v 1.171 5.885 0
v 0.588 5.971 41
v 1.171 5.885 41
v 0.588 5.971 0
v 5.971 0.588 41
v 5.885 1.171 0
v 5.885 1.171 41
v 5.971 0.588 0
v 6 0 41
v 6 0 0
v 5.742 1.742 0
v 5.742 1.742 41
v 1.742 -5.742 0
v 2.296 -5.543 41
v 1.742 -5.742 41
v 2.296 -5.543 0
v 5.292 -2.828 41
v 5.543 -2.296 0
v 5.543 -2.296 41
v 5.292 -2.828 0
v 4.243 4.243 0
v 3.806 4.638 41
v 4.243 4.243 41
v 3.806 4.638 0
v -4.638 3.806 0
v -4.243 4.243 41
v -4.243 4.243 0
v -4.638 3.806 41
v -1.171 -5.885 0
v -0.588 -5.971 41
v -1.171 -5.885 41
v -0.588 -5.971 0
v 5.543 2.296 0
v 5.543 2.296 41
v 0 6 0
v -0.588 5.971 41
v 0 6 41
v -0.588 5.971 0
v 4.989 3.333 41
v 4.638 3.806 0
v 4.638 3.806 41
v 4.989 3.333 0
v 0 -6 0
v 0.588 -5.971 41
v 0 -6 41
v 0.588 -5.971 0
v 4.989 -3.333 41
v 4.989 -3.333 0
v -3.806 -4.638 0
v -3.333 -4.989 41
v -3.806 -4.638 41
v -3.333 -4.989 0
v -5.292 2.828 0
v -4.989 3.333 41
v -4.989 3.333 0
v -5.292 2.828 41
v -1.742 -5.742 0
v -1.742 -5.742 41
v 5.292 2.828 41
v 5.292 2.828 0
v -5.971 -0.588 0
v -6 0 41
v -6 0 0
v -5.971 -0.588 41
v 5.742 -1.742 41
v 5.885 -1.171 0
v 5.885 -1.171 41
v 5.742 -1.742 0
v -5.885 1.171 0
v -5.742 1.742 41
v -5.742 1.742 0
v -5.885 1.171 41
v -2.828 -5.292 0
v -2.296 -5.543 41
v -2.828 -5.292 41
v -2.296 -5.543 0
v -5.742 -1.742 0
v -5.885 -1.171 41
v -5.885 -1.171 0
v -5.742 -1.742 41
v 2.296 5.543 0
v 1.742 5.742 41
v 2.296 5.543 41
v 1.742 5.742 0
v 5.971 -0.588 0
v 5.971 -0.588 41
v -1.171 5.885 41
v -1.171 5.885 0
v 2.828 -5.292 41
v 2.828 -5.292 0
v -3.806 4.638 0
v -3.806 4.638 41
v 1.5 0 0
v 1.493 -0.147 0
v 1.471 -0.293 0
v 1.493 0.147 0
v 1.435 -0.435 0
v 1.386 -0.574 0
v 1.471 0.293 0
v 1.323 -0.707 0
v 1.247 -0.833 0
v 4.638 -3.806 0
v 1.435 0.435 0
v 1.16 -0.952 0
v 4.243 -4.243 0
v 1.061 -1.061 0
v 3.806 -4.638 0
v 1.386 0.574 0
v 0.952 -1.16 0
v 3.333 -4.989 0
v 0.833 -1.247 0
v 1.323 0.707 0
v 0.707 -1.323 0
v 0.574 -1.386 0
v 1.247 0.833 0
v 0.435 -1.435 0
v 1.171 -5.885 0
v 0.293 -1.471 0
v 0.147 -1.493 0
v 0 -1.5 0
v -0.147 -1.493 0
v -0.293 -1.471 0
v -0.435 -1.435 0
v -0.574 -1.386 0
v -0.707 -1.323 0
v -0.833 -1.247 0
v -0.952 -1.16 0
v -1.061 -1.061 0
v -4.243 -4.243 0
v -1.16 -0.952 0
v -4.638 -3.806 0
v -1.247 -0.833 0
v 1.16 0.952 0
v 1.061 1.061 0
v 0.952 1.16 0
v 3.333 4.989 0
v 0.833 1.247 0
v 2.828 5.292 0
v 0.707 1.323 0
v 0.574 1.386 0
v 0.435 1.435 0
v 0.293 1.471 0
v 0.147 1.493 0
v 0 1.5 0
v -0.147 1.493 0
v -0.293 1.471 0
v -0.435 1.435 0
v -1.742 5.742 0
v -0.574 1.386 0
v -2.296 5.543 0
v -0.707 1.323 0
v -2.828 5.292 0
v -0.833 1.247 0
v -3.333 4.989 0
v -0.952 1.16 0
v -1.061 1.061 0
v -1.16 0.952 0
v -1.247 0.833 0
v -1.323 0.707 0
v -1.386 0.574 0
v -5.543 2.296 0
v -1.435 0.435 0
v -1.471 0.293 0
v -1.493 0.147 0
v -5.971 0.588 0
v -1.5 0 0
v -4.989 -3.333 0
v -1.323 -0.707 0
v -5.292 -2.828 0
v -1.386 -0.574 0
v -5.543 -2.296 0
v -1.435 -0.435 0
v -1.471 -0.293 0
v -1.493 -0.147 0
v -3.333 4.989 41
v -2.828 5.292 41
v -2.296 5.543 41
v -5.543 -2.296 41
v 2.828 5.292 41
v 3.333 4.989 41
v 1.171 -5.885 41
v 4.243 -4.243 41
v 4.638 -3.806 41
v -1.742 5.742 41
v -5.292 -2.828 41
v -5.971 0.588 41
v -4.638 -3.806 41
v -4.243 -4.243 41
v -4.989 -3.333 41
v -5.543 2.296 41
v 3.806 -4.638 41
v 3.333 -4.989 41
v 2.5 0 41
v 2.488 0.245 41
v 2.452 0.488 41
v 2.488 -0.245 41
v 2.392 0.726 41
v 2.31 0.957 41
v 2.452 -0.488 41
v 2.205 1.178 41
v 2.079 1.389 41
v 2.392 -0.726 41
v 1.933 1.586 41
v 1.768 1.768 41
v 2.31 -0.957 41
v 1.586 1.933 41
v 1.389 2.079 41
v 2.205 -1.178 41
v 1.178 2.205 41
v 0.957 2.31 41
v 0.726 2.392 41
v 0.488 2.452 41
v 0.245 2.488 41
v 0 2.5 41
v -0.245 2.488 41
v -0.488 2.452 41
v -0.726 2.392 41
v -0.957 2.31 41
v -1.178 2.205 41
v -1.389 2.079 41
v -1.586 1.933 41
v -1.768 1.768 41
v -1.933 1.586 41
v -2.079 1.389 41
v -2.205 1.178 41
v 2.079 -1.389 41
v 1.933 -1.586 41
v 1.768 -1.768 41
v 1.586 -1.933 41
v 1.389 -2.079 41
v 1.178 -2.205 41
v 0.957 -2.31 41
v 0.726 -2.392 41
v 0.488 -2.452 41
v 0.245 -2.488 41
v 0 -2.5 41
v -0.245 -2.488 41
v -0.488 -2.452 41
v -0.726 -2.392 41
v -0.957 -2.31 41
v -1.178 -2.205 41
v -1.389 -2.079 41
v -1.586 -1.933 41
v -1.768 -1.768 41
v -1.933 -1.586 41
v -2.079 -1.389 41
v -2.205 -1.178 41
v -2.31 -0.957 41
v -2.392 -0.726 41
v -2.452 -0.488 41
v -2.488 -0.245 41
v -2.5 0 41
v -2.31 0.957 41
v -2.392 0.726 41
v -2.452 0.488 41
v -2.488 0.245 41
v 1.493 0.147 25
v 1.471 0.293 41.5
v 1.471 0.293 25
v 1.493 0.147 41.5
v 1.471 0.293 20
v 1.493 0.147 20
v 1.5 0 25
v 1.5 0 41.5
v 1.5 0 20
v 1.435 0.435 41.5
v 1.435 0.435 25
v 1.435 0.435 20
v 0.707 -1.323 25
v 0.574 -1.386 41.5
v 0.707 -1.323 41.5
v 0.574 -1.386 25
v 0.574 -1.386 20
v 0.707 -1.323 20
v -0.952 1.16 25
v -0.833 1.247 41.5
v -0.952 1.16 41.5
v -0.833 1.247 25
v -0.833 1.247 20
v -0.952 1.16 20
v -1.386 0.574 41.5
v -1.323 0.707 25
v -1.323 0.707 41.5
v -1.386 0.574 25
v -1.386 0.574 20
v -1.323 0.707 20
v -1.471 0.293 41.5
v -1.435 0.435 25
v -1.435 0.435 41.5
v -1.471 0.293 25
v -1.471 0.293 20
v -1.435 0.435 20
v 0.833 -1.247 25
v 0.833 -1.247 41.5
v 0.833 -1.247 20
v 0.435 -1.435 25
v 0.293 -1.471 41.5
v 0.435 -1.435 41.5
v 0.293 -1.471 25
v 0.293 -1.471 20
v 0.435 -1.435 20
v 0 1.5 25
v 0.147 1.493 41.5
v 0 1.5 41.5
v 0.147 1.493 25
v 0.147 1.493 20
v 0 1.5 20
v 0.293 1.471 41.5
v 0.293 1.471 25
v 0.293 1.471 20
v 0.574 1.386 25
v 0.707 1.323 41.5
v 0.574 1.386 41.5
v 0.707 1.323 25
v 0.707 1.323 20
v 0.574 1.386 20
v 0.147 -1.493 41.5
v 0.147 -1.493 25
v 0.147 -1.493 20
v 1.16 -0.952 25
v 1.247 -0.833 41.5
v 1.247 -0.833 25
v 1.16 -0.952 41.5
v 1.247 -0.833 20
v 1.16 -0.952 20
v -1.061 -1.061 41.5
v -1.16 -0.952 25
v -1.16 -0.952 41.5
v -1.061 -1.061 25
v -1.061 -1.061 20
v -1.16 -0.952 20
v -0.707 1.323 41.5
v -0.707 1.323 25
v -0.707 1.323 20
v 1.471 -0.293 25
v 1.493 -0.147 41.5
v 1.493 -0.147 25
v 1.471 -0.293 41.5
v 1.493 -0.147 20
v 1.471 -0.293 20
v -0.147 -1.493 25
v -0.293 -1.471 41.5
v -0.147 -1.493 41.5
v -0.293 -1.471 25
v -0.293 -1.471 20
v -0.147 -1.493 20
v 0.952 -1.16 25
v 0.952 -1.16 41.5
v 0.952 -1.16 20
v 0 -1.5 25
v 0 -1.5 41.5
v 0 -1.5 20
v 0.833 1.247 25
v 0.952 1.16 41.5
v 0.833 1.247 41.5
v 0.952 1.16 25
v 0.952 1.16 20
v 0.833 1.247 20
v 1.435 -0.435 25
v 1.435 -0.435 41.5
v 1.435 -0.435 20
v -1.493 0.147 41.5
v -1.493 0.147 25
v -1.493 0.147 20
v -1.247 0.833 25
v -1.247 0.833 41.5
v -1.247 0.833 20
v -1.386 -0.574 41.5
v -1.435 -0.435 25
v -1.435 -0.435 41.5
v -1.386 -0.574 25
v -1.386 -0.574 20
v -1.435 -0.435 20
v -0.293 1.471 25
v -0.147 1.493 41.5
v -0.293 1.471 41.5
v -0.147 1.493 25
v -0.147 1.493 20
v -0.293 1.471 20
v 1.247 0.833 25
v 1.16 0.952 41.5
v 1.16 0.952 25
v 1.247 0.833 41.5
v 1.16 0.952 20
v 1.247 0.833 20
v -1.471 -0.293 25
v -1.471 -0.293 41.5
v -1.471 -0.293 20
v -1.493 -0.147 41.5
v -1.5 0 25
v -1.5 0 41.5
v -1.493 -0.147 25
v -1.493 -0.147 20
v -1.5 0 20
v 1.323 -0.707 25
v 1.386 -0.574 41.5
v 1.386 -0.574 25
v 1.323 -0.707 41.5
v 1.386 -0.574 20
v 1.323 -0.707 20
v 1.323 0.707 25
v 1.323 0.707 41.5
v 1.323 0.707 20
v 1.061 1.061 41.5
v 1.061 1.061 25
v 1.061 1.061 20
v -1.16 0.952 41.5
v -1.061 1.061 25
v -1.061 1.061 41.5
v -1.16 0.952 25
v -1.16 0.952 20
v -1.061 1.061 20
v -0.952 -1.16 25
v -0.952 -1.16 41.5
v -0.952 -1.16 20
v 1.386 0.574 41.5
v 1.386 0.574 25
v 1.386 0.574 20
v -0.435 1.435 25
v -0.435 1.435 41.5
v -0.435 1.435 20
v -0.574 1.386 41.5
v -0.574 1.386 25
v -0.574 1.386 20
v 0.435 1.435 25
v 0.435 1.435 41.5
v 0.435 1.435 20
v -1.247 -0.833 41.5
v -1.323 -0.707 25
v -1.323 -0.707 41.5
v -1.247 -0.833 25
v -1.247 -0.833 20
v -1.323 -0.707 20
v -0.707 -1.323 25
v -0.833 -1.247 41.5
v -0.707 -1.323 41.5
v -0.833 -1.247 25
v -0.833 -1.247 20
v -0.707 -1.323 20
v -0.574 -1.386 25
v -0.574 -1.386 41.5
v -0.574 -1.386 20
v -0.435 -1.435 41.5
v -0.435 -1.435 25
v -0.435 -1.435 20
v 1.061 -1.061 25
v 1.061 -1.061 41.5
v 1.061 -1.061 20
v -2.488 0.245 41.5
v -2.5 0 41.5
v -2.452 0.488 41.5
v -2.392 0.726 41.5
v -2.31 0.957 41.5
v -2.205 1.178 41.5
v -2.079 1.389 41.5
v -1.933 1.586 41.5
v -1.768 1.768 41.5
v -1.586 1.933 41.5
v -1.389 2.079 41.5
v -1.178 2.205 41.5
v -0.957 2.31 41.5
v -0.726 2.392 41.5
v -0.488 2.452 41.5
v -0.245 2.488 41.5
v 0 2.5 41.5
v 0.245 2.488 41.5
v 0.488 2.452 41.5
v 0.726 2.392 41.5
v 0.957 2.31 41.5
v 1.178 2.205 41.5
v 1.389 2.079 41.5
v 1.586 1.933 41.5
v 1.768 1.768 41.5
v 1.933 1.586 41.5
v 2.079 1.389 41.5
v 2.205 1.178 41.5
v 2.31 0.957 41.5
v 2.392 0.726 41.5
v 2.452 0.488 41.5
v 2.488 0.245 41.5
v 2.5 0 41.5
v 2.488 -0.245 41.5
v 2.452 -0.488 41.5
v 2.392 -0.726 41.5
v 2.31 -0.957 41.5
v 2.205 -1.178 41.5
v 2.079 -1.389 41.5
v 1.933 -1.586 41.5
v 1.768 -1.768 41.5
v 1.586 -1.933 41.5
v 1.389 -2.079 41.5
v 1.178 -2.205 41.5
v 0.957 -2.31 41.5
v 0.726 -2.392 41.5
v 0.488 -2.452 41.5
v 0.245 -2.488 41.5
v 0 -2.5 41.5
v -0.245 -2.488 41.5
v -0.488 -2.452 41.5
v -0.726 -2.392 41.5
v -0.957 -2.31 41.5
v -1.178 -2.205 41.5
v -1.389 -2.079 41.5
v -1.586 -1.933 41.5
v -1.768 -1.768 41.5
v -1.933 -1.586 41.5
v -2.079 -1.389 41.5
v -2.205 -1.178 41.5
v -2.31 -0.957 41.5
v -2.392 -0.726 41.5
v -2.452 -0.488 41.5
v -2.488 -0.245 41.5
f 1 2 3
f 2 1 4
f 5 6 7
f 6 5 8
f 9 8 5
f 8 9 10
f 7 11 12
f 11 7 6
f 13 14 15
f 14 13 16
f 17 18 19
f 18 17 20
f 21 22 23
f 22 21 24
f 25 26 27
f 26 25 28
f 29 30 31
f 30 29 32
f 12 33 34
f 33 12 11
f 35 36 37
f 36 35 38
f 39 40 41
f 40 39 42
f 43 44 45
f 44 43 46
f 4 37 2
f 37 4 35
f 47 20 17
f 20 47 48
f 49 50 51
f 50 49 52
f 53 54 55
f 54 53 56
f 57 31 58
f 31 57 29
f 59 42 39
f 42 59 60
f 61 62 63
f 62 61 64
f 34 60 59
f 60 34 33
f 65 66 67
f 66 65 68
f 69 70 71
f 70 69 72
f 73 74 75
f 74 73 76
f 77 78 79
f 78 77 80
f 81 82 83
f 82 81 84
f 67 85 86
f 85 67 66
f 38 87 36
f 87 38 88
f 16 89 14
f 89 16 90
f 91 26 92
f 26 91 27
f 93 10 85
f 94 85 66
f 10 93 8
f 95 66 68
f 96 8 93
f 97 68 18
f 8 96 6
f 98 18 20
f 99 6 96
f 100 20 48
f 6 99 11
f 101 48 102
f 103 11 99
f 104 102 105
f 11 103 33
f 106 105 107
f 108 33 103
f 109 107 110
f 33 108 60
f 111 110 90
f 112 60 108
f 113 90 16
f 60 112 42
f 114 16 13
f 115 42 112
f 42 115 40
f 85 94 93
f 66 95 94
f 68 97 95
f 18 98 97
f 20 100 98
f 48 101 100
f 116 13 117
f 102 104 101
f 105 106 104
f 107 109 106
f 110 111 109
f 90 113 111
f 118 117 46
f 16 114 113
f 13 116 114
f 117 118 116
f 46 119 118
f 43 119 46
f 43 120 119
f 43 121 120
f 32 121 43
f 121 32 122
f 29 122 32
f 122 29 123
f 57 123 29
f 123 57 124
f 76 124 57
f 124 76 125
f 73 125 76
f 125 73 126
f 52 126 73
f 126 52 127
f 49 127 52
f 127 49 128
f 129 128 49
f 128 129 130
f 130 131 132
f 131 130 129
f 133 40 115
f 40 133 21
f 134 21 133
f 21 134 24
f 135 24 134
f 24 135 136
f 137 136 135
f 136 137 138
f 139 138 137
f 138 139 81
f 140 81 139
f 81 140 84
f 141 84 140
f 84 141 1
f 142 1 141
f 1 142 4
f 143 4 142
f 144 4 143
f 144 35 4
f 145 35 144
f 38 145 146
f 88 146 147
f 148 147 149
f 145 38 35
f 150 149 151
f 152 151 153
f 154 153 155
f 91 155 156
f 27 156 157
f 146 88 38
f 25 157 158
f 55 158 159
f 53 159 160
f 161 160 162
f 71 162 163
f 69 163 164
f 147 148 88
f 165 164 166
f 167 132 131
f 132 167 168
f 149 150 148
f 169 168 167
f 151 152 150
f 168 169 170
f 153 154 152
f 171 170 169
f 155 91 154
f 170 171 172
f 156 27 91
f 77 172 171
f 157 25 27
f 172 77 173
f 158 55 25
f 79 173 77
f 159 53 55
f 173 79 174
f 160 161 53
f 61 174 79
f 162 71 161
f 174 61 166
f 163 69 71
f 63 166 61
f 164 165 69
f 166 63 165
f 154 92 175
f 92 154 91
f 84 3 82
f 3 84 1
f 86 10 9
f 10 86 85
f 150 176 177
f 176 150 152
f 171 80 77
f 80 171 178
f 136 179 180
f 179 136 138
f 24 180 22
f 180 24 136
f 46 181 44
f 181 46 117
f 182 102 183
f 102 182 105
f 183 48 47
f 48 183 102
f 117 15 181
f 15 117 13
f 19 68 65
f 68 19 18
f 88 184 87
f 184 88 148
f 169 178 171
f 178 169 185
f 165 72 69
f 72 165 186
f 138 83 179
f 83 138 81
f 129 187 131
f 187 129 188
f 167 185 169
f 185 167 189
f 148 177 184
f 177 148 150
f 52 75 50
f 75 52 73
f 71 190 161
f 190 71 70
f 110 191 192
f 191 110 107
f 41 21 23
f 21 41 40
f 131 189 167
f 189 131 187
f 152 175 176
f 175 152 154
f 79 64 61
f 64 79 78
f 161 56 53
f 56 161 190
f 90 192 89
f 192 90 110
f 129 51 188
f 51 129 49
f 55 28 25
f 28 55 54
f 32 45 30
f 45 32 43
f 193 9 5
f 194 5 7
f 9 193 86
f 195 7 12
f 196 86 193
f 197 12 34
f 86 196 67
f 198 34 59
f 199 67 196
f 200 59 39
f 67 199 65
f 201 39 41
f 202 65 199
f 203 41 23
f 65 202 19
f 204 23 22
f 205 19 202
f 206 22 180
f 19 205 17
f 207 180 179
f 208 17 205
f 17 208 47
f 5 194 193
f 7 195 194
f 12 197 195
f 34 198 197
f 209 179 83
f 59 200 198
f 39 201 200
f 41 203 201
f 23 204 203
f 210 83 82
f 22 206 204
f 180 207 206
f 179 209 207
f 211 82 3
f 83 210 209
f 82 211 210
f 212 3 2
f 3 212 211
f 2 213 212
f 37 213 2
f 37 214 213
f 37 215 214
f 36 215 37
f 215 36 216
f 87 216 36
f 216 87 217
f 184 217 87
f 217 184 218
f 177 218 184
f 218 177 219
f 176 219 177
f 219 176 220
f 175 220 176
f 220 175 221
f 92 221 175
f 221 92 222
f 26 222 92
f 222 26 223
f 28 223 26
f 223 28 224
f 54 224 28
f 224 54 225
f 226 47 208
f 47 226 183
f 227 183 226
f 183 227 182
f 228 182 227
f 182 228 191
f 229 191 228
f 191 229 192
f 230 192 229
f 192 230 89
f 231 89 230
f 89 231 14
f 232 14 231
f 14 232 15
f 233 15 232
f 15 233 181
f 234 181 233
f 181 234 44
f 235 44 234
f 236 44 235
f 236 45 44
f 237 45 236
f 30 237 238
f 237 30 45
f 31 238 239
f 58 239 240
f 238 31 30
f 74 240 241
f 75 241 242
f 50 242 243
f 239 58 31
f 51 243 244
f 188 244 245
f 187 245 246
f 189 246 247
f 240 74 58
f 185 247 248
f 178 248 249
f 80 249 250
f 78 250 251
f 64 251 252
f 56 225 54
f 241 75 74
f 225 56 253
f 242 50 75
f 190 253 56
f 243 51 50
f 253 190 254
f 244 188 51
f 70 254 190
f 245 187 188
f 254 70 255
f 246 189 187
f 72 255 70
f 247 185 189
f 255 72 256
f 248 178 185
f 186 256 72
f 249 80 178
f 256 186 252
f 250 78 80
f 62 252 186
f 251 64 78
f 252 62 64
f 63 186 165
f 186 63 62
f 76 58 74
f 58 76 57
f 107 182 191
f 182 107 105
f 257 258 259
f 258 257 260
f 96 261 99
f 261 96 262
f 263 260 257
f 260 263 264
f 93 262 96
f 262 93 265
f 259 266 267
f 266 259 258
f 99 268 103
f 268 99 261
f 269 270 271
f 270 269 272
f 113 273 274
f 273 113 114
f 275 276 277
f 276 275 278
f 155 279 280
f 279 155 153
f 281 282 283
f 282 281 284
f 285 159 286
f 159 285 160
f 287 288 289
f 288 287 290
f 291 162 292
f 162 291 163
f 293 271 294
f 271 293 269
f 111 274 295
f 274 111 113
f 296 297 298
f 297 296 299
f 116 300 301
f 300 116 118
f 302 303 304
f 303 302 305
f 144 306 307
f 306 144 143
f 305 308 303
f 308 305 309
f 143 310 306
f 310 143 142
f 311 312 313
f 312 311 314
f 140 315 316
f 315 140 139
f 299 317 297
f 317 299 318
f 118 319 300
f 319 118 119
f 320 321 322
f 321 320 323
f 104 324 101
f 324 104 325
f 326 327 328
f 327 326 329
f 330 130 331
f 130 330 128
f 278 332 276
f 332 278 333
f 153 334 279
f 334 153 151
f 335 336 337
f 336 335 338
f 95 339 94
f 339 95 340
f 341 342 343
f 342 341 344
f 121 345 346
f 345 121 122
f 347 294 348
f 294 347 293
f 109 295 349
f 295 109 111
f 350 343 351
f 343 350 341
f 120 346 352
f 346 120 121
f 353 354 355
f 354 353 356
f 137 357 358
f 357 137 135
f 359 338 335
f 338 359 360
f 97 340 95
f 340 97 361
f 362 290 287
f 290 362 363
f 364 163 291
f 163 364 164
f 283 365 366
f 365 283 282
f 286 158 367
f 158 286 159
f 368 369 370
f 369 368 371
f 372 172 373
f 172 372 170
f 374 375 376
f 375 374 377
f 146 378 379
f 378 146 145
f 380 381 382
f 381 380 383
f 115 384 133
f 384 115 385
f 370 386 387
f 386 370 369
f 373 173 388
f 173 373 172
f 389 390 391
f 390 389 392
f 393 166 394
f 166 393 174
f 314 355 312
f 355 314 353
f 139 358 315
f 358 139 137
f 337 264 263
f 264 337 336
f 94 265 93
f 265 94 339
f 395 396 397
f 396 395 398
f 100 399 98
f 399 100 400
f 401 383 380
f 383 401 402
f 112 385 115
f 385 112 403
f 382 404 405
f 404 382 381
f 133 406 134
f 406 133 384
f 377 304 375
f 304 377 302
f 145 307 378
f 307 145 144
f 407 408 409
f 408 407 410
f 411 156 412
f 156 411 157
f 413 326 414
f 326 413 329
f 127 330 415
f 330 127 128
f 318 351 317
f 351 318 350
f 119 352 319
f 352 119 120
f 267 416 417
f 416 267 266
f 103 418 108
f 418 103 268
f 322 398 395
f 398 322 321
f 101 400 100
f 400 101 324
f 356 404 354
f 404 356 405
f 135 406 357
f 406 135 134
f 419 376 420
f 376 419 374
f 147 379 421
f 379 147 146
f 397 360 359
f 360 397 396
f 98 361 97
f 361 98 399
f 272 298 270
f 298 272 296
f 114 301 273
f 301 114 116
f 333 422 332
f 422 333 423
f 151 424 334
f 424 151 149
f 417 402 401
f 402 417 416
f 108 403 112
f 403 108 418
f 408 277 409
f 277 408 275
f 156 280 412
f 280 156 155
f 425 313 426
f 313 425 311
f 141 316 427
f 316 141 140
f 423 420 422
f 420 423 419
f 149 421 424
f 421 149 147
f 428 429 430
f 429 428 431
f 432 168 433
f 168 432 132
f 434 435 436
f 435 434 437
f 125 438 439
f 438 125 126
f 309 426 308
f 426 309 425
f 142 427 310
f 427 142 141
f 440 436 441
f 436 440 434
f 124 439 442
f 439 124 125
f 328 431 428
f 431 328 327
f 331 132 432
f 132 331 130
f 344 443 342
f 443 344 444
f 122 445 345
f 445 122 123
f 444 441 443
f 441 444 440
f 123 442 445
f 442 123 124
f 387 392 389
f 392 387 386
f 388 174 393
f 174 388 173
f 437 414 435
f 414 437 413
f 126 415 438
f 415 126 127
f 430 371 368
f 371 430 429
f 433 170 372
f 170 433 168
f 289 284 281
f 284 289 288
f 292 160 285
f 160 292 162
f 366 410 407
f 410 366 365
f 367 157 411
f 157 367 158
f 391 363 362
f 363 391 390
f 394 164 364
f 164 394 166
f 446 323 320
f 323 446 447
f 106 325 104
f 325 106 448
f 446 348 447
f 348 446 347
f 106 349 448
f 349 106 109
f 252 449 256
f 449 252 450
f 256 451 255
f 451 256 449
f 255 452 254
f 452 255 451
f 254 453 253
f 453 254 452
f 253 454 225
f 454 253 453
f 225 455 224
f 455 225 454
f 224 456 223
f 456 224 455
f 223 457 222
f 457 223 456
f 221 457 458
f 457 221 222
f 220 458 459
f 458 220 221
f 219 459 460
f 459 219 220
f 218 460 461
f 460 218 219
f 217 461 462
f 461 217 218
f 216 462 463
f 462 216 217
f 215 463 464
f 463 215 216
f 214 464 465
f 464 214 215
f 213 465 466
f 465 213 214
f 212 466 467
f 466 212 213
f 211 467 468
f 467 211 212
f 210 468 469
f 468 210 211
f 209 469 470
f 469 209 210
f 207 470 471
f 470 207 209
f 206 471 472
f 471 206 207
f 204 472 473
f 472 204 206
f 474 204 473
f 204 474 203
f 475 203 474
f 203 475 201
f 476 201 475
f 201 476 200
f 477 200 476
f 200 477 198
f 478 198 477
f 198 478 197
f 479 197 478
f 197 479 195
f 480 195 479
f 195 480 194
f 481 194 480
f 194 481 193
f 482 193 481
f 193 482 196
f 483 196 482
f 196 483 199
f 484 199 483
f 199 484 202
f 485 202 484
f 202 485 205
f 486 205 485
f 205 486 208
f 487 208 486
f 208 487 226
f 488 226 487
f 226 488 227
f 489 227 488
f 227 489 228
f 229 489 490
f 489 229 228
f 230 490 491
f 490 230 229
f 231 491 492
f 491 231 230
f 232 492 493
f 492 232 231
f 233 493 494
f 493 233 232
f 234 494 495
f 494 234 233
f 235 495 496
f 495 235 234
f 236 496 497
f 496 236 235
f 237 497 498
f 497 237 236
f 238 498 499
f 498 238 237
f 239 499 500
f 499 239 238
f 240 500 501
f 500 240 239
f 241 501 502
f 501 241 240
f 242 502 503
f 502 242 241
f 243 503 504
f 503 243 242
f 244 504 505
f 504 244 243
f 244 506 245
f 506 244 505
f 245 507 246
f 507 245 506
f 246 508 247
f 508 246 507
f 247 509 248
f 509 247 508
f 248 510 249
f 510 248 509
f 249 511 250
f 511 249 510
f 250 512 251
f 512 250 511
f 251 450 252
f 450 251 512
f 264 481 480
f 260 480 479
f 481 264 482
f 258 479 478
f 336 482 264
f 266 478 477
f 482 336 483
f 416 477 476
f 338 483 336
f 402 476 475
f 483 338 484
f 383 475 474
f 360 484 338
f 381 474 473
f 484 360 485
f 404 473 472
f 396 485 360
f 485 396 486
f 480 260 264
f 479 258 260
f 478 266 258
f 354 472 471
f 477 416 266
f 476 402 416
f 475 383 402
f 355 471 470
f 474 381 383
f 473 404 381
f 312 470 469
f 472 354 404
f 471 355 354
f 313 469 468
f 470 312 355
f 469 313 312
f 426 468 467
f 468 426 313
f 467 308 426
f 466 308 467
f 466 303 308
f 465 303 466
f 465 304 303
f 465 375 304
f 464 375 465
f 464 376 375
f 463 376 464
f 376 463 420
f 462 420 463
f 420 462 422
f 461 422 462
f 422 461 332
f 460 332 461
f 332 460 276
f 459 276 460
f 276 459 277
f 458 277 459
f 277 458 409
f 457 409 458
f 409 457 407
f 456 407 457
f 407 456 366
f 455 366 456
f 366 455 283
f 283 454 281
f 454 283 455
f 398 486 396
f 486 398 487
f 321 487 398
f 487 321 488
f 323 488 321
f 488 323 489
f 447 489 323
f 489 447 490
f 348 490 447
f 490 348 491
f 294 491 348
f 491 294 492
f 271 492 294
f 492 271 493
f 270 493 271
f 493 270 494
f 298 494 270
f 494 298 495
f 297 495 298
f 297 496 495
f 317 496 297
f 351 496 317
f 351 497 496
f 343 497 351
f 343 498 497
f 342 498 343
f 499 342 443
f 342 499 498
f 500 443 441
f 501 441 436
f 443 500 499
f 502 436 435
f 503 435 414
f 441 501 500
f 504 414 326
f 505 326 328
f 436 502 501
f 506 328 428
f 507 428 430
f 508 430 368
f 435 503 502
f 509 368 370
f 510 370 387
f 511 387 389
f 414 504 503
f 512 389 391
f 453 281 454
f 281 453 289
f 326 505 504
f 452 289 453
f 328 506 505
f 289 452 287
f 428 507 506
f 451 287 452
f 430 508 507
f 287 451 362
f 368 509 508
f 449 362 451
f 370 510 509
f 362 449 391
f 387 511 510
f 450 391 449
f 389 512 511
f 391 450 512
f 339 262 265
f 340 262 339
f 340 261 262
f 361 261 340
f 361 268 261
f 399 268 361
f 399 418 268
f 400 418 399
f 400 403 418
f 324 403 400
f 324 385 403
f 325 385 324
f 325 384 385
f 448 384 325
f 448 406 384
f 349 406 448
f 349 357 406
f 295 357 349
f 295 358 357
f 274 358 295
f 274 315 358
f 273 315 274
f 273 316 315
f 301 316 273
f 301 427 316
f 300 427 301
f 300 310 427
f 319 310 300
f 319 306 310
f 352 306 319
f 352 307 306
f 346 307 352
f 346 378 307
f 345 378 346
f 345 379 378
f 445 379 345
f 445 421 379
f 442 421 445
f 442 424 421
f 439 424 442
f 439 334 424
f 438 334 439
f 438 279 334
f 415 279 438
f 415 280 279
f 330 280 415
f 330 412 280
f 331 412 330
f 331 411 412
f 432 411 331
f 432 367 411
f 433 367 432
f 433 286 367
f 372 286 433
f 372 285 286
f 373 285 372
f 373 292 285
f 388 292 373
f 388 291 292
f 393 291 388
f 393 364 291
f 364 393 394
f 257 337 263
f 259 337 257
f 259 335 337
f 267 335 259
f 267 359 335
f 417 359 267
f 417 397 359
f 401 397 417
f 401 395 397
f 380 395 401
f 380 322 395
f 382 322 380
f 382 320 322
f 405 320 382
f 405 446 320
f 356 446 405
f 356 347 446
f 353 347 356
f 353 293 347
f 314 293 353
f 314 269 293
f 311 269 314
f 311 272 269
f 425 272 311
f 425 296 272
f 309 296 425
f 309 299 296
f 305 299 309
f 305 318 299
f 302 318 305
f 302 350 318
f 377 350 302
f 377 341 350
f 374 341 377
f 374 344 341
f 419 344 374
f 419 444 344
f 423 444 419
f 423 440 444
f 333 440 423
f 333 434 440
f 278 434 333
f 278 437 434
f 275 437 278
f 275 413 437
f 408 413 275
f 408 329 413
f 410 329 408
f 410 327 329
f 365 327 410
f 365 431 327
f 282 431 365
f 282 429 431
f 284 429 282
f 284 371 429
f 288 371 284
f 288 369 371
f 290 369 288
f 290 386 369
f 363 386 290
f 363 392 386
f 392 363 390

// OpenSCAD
// Hose-Barb Reducer Design (Corrected)
// Units: mm
// Orientation: Standing upright on XY plane, building +Z

// --- Dimensions ---
// Main bore diameter
$main_bore_d = 3.0;
$main_bore_r = $main_bore_d / 2.0;

// Section 1: 8mm Tubing Interface (z=0 to z=20)
$sec1_start_z = 0;
$sec1_end_z = 20;
$sec1_barb_height = 10;
$sec1_barb_bottom_od = 7.5;
$sec1_barb_top_od = 9.5;
$sec1_barb_count = 2;
$sec1_barb_spacing = 12; // Center-to-center distance between barbs

// Section 2: Collar (z=20 to z=25)
$sec2_start_z = 20;
$sec2_end_z = 25;
$sec2_collar_od = 12;
$sec2_collar_id = $main_bore_d; // Matches main bore

// Section 3: 5mm Tubing Interface (z=25 to z=41)
$sec3_start_z = 25;
$sec3_end_z = 41;
$sec3_barb_height = 8;
$sec3_barb_bottom_od = 6.5;
$sec3_barb_top_od = 5.0;
$sec3_barb_count = 2;
$sec3_barb_spacing = 10; // Center-to-center distance between barbs

// --- Helper: Create Barb Profile Points ---
// Returns a list of [x, z] points for the cross-section of one barb
// z_start, z_end: The Z range of the barb
// r_bottom, r_top: Radii at bottom and top
// r_inner: Radius of the main bore (to ensure hole goes through)
// The profile is defined in the XZ plane, rotated around Z.
function get_barb_profile_points(z_start, z_end, r_bottom, r_top, r_inner) = 
    [
        // Bottom flat face (inner radius to outer radius)
        [r_inner, z_start],
        [r_bottom, z_start],
        // Taper up
        [r_bottom, z_end],
        [r_top, z_end],
        // Step out (flat top face)
        [r_top, z_end + 0.5],
        [r_inner, z_end + 0.5],
        // Close loop back to start
        [r_inner, z_start]
    ];

// --- Main Build ---

$fn = 64;

// We build the part in three main components:
// 1. The Main Body (Cylinder with central bore)
// 2. The Barbs (Union of all barb shapes)
// 3. The Collar (Cylinder)
// Then we Union them all together.

// 1. Main Body
// Height must cover the full length (41mm)
// Radius must be large enough to contain the widest part of the barbs (9.5mm)
// We add a tiny bit of safety margin for the collar calculation if needed, but 9.5 is the max OD.
// However, the collar is 12mm, so the main body radius must be at least 6mm.
// Let's make the main body radius 6mm (12mm OD) to cover the collar, 
// and the barbs will be added on top of this base.
$main_body_r = $sec2_collar_od / 2.0; 

translate([0, 0, 0])
difference() {
    // Outer shell of the main body
    cylinder(h = $sec3_end_z, r = $main_body_r, $fn = 64);
    
    // Inner bore through the whole length
    cylinder(h = $sec3_end_z, r = $main_bore_r, $fn = 64);
}

// 2. Section 1 Barbs (8mm tubing)
// Stacked at z=0 and z=10
translate([0, 0, 0])
union() {
    for (i = [0, 1]) {
        $z_pos = i * $sec1_barb_height;
        
        // Calculate radii
        $r_bottom = $sec1_barb_bottom_od / 2.0;
        $r_top = $sec1_barb_top_od / 2.0;
        
        // Get profile points
        $pts = get_barb_profile_points($z_pos, $z_pos + $sec1_barb_height, $r_bottom, $r_top, $main_bore_r);
        
        // Extrude the profile
        // The height of extrusion is the barb height + the step height (0.5mm)
        $extrude_h = $sec1_barb_height + 0.5;
        
        rotate_extrude()
        polygon(points = $pts);
    }
}

// 3. Section 2 Collar (z=20 to z=25)
translate([0, 0, $sec2_start_z])
cylinder(h = $sec2_end_z - $sec2_start_z, r = $sec2_collar_od / 2.0, $fn = 64);

// 4. Section 3 Barbs (5mm tubing)
// Stacked at z=25 and z=33
translate([0, 0, 0])
union() {
    for (i = [0, 1]) {
        $z_pos = $sec3_start_z + i * $sec3_barb_height;
        
        // Calculate radii
        $r_bottom = $sec3_barb_bottom_od / 2.0;
        $r_top = $sec3_barb_top_od / 2.0;
        
        // Get profile points
        $pts = get_barb_profile_points($z_pos, $z_pos + $sec3_barb_height, $r_bottom, $r_top, $main_bore_r);
        
        // Extrude the profile
        $extrude_h = $sec3_barb_height + 0.5;
        
        rotate_extrude()
        polygon(points = $pts);
    }
}
